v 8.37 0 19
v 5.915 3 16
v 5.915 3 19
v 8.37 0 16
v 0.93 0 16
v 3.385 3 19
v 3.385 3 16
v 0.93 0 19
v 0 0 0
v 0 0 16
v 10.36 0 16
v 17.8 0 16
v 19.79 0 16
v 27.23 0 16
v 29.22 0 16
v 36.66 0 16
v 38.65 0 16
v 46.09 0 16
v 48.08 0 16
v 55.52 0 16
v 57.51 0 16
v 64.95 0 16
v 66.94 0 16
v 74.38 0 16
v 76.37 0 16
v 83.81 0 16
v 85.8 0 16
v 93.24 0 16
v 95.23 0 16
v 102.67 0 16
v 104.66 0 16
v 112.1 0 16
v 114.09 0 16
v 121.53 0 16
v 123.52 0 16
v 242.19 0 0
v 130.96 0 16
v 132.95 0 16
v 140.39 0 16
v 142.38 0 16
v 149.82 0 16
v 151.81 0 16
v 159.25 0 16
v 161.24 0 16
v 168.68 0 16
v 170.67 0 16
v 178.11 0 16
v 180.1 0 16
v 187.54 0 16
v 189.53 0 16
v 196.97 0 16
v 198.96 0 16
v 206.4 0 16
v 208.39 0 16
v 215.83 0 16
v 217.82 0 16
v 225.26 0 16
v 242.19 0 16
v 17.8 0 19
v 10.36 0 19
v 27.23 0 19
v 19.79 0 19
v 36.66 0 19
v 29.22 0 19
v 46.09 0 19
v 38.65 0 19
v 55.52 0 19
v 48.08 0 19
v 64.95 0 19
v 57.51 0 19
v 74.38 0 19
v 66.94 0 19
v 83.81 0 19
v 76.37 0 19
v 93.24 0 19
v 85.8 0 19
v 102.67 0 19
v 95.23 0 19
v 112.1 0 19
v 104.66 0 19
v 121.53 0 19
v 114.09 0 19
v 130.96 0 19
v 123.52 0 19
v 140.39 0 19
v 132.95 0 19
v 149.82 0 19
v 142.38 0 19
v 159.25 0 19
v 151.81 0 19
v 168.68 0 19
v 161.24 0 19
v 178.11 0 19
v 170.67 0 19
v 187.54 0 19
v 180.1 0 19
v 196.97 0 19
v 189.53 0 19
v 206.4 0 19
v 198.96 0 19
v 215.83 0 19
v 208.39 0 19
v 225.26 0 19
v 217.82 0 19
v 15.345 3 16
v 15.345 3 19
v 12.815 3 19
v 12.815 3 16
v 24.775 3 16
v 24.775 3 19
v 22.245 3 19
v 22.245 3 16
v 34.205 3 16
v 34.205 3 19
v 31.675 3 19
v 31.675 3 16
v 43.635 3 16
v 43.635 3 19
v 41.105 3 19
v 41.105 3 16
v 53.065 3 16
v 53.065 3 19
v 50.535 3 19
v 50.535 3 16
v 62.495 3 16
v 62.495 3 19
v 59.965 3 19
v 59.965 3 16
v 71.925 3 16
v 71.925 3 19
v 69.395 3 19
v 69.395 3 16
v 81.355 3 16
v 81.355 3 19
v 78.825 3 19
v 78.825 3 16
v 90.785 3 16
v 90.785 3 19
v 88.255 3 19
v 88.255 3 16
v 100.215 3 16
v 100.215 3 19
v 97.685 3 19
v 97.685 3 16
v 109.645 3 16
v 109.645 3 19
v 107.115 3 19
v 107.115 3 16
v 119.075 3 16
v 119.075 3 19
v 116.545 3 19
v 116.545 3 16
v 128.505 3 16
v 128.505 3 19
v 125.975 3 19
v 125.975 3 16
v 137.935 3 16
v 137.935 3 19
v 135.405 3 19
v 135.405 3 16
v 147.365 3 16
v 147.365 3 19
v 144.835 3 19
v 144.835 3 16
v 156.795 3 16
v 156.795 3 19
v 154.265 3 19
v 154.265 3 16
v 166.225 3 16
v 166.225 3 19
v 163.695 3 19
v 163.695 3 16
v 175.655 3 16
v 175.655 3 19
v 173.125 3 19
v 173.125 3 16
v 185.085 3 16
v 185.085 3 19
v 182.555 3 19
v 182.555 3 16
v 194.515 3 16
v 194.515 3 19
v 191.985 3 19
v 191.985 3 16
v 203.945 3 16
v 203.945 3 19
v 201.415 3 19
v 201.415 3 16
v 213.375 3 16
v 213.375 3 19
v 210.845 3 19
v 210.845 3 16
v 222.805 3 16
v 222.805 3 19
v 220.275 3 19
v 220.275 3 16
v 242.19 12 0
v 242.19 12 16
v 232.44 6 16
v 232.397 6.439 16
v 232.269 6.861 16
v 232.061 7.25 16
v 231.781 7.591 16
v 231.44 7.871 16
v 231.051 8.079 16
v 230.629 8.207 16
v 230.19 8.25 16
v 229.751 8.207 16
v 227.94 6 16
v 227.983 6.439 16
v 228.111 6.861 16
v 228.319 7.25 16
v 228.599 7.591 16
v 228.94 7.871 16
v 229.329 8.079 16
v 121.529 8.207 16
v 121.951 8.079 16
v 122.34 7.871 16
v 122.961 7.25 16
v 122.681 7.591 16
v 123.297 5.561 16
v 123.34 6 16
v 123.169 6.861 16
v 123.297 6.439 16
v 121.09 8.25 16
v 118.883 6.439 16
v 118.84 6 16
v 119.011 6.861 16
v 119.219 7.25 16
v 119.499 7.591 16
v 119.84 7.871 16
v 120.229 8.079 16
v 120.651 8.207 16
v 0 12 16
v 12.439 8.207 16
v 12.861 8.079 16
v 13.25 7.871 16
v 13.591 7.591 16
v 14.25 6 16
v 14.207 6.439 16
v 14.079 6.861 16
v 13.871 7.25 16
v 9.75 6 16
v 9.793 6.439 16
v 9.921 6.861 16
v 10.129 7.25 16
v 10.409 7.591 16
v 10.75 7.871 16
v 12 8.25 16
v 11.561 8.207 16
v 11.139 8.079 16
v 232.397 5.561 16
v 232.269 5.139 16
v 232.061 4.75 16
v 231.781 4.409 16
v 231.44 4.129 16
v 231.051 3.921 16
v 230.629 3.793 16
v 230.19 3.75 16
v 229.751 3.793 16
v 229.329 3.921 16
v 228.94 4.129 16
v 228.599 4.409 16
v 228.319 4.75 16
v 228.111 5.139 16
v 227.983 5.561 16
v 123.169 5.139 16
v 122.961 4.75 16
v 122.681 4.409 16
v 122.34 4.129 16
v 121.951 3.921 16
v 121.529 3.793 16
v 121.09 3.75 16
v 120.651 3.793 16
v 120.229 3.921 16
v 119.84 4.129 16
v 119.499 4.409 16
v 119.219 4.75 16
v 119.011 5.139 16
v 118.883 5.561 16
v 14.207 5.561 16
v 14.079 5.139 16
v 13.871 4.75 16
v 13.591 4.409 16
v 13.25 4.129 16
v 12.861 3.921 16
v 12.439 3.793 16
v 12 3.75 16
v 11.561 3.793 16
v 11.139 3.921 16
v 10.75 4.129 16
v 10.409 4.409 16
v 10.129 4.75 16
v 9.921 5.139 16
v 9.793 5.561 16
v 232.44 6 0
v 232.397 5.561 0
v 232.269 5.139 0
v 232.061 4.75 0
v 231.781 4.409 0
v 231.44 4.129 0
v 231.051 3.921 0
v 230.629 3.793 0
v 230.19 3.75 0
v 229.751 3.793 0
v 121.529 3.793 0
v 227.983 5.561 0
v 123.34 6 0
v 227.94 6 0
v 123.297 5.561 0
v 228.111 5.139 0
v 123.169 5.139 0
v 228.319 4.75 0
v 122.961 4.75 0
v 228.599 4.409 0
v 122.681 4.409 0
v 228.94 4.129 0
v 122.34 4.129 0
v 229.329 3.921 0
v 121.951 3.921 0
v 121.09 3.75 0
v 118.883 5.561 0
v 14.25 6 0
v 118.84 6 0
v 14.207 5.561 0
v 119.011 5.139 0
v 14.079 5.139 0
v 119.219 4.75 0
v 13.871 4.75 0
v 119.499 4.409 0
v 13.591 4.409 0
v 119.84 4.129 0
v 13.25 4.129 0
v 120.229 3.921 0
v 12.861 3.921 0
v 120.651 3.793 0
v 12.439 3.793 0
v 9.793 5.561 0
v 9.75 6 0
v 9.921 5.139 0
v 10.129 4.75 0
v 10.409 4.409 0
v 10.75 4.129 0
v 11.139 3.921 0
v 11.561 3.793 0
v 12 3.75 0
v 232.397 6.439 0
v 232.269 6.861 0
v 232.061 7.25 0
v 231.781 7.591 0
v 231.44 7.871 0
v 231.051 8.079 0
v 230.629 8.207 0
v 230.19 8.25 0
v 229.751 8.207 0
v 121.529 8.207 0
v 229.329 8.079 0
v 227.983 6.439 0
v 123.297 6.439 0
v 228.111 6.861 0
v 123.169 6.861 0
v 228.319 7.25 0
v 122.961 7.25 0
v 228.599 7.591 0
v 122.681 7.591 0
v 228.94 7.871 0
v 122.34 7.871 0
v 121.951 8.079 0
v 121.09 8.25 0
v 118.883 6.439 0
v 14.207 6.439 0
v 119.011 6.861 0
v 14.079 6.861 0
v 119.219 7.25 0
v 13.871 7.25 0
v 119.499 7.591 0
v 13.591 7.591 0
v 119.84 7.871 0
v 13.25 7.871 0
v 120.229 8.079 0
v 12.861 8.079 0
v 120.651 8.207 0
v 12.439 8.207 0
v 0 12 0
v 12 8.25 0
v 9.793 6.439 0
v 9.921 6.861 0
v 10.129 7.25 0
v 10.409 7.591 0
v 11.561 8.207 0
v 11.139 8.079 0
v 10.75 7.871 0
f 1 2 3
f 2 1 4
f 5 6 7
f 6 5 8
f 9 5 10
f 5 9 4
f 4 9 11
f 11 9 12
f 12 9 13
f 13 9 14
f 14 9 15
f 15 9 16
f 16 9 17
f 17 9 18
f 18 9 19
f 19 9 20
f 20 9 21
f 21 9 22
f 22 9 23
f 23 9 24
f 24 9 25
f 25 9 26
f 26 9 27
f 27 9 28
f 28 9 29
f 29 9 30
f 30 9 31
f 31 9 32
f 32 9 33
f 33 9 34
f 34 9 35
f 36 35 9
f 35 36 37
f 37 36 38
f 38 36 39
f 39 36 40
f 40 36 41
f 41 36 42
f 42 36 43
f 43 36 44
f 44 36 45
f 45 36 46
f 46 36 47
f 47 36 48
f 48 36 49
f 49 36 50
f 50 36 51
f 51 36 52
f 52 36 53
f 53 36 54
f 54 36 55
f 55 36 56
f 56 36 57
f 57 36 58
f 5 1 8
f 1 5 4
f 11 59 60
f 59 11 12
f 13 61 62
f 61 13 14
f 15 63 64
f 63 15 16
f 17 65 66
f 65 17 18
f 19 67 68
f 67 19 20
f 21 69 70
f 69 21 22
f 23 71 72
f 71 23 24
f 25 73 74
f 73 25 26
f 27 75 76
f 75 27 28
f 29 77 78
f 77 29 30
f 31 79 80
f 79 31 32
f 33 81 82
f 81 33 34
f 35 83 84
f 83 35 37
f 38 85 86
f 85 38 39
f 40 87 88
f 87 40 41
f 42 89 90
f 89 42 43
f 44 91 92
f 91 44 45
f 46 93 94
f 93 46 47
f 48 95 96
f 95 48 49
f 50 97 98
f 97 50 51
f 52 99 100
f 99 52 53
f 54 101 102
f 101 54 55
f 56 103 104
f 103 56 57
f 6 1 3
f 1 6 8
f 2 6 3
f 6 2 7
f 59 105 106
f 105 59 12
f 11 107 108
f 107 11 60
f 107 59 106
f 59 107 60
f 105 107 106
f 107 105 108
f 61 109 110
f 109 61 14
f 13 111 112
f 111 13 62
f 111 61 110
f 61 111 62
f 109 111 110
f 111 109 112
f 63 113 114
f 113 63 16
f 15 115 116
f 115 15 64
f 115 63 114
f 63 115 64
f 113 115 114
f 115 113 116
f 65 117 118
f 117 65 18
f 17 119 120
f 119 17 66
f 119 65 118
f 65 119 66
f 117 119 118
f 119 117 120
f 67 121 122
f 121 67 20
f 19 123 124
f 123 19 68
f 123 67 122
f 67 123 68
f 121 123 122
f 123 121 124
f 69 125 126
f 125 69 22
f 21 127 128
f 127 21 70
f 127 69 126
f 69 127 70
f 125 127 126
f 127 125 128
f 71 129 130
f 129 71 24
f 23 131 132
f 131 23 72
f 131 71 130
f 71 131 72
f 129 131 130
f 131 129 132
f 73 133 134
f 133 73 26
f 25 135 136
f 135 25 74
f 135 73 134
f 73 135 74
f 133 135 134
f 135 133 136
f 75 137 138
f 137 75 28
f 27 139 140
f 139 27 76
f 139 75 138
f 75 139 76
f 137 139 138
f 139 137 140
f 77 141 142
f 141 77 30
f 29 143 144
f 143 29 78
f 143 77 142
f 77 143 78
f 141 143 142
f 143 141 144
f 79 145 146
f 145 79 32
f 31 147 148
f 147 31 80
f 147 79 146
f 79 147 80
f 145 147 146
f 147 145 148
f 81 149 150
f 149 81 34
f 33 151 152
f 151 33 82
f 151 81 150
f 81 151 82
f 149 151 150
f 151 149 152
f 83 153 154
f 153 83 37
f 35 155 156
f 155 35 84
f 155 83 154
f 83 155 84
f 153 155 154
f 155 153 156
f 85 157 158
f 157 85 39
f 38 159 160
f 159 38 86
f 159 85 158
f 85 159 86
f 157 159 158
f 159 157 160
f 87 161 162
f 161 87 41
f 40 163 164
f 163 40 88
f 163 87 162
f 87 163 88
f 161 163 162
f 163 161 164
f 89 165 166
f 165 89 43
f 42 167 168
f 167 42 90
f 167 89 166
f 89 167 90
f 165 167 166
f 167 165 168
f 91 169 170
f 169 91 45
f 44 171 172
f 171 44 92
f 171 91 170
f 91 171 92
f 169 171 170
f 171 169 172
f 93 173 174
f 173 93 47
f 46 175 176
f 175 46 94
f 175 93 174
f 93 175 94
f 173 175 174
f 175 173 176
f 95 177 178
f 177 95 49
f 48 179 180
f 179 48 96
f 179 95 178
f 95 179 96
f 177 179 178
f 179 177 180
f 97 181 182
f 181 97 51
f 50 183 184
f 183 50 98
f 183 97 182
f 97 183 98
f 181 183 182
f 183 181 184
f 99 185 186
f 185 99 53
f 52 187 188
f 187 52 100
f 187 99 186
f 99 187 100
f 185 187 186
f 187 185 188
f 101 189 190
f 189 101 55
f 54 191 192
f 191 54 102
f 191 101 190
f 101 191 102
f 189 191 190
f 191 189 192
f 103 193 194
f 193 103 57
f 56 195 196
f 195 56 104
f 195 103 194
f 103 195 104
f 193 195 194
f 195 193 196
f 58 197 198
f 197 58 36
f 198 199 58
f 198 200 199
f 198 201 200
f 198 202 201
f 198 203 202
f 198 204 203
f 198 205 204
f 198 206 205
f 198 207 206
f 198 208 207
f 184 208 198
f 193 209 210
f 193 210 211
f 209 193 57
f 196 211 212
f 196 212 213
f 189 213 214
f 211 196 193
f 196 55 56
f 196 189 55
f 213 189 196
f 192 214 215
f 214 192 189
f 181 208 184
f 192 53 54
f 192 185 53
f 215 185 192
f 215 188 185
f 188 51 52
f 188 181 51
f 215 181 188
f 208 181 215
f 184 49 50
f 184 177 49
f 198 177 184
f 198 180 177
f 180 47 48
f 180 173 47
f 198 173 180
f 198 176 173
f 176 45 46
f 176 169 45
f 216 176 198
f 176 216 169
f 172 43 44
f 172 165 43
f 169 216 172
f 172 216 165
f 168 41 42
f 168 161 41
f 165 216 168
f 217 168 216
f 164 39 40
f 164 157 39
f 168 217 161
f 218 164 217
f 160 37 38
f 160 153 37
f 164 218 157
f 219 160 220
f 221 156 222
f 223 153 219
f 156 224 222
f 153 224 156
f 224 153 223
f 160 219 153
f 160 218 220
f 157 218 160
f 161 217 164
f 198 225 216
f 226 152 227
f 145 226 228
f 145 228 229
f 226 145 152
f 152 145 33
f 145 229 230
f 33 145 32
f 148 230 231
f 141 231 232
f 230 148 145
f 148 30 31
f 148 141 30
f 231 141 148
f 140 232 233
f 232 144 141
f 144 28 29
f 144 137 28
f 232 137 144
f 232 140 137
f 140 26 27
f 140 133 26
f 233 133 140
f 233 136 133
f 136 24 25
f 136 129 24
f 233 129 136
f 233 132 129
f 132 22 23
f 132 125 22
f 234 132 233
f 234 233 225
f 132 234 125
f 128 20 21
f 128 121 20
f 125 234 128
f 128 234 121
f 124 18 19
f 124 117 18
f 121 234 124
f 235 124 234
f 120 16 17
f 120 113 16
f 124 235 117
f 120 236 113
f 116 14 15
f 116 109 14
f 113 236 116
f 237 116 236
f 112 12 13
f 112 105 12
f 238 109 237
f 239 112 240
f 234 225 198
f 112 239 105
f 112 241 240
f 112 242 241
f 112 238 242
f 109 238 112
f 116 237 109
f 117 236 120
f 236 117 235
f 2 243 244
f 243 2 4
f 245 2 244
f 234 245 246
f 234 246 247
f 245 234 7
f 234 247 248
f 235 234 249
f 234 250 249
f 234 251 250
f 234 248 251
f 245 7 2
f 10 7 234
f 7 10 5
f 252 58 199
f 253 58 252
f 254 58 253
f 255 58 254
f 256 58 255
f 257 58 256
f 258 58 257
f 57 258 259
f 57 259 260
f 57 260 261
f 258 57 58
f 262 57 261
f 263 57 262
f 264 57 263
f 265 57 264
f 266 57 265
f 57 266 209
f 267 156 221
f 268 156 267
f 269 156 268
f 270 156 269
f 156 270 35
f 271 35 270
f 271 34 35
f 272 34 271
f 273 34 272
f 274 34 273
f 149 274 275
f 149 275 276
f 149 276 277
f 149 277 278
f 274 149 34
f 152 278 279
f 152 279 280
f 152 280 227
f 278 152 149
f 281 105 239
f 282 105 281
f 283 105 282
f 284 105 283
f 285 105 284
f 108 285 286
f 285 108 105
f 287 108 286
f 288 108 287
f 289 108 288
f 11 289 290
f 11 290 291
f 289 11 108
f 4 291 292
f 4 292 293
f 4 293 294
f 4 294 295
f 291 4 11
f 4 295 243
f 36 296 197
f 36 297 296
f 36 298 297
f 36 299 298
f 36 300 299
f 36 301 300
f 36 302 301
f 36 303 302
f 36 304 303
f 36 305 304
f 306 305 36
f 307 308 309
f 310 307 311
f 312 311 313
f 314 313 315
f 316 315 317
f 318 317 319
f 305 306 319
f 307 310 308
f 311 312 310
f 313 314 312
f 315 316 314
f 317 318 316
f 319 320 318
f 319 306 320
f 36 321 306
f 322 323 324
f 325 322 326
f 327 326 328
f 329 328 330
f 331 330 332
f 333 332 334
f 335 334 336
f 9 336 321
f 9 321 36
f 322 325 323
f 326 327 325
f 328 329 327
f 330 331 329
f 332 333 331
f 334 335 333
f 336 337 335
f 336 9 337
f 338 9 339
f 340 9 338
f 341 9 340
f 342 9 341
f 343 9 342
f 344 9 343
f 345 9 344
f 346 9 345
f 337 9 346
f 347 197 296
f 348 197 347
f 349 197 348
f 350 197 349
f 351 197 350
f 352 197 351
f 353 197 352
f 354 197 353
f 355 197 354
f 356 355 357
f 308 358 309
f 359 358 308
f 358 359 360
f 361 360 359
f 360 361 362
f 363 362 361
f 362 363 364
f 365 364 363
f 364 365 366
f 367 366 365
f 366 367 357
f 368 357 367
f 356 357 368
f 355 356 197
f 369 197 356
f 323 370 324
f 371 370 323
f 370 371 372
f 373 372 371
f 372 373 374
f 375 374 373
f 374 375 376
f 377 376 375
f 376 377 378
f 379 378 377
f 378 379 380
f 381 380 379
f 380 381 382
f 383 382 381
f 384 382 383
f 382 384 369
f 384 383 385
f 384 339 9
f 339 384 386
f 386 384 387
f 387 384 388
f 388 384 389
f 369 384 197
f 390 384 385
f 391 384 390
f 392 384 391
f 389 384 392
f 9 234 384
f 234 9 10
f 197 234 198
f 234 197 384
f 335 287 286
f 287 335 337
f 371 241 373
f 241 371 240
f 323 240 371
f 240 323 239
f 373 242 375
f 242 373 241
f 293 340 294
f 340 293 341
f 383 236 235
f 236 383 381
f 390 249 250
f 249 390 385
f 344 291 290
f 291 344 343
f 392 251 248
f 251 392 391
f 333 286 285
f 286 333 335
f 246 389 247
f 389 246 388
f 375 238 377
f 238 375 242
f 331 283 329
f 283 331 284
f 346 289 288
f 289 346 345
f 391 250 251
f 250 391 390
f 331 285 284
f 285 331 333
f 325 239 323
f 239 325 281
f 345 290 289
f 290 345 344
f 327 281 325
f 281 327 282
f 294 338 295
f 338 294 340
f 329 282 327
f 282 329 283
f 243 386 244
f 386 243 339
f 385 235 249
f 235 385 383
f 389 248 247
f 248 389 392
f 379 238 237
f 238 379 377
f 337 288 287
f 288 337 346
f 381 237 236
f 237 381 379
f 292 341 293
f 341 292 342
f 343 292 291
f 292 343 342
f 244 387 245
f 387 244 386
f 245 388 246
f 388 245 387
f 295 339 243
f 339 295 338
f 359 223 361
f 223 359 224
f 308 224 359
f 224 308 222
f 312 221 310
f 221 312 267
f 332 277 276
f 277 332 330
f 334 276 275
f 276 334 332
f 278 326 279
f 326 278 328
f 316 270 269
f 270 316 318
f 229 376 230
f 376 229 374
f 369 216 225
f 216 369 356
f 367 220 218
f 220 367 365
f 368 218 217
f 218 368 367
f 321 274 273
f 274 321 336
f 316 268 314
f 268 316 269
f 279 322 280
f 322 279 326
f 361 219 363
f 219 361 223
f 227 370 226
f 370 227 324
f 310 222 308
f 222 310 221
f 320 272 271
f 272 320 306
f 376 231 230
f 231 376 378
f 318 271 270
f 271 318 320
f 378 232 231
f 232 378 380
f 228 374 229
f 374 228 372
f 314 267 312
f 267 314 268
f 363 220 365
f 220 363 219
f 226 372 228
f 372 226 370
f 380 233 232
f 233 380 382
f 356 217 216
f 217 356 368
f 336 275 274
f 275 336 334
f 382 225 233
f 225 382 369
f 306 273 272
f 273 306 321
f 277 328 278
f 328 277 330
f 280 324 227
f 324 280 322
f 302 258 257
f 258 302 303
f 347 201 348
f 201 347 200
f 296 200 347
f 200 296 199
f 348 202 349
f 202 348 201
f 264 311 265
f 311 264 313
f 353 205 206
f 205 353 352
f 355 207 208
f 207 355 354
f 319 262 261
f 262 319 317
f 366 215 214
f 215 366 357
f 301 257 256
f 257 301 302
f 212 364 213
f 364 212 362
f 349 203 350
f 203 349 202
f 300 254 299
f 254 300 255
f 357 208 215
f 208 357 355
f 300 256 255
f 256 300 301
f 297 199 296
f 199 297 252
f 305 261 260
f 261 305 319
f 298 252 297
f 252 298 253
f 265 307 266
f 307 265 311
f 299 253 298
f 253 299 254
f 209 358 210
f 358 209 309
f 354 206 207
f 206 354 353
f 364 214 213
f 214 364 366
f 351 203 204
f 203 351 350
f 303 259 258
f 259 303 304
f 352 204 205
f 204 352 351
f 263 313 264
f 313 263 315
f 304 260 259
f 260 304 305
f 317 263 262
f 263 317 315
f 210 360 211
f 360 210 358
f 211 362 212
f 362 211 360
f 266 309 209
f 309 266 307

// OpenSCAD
$fn = 32;

// ----------------------------------------------------------------------
// Gear rack: m=3 z=24, 242.19 x 12 x 19 mm
// ----------------------------------------------------------------------

// --- parameters (mm) ---
rack_len = 242.19;        // rack length, X
rack_w = 12;              // rack width, Y
rack_h = 19;              // overall height, Z
modul = 3;                // module
body_t = 16;              // tooth root line height
pitch = 9.43;             // circular pitch
tip_w = 2.53;             // tooth thickness at the tip
root_w = 7.44;            // tooth thickness at the root line
hole_d = 4.5;             // mounting hole
sink = 0.6;               // tooth root overlap into the body

tooth_span = 226.19;

module tooth(x0) {
  /* 20 deg flank profile, sunk into the body for a positive overlap */
  translate([x0, 0, body_t - sink])
    linear_extrude(height = rack_h - body_t + sink)
      polygon(points = [[-root_w / 2, 0], [root_w / 2, 0],
                        [tip_w / 2, rack_h - body_t],
                        [-tip_w / 2, rack_h - body_t]]);
}

difference() {
  union() {
    cube([rack_len, rack_w, body_t]);
    for (i = [0 : 24 - 1])
      tooth((i + 0.5) * pitch + (tooth_span - 24 * pitch) / 2);
  }
  translate([12, 6, -1]) cylinder(h = body_t + 2, d = hole_d);
  translate([121.09, 6, -1]) cylinder(h = body_t + 2, d = hole_d);
  translate([230.19, 6, -1]) cylinder(h = body_t + 2, d = hole_d);
}
